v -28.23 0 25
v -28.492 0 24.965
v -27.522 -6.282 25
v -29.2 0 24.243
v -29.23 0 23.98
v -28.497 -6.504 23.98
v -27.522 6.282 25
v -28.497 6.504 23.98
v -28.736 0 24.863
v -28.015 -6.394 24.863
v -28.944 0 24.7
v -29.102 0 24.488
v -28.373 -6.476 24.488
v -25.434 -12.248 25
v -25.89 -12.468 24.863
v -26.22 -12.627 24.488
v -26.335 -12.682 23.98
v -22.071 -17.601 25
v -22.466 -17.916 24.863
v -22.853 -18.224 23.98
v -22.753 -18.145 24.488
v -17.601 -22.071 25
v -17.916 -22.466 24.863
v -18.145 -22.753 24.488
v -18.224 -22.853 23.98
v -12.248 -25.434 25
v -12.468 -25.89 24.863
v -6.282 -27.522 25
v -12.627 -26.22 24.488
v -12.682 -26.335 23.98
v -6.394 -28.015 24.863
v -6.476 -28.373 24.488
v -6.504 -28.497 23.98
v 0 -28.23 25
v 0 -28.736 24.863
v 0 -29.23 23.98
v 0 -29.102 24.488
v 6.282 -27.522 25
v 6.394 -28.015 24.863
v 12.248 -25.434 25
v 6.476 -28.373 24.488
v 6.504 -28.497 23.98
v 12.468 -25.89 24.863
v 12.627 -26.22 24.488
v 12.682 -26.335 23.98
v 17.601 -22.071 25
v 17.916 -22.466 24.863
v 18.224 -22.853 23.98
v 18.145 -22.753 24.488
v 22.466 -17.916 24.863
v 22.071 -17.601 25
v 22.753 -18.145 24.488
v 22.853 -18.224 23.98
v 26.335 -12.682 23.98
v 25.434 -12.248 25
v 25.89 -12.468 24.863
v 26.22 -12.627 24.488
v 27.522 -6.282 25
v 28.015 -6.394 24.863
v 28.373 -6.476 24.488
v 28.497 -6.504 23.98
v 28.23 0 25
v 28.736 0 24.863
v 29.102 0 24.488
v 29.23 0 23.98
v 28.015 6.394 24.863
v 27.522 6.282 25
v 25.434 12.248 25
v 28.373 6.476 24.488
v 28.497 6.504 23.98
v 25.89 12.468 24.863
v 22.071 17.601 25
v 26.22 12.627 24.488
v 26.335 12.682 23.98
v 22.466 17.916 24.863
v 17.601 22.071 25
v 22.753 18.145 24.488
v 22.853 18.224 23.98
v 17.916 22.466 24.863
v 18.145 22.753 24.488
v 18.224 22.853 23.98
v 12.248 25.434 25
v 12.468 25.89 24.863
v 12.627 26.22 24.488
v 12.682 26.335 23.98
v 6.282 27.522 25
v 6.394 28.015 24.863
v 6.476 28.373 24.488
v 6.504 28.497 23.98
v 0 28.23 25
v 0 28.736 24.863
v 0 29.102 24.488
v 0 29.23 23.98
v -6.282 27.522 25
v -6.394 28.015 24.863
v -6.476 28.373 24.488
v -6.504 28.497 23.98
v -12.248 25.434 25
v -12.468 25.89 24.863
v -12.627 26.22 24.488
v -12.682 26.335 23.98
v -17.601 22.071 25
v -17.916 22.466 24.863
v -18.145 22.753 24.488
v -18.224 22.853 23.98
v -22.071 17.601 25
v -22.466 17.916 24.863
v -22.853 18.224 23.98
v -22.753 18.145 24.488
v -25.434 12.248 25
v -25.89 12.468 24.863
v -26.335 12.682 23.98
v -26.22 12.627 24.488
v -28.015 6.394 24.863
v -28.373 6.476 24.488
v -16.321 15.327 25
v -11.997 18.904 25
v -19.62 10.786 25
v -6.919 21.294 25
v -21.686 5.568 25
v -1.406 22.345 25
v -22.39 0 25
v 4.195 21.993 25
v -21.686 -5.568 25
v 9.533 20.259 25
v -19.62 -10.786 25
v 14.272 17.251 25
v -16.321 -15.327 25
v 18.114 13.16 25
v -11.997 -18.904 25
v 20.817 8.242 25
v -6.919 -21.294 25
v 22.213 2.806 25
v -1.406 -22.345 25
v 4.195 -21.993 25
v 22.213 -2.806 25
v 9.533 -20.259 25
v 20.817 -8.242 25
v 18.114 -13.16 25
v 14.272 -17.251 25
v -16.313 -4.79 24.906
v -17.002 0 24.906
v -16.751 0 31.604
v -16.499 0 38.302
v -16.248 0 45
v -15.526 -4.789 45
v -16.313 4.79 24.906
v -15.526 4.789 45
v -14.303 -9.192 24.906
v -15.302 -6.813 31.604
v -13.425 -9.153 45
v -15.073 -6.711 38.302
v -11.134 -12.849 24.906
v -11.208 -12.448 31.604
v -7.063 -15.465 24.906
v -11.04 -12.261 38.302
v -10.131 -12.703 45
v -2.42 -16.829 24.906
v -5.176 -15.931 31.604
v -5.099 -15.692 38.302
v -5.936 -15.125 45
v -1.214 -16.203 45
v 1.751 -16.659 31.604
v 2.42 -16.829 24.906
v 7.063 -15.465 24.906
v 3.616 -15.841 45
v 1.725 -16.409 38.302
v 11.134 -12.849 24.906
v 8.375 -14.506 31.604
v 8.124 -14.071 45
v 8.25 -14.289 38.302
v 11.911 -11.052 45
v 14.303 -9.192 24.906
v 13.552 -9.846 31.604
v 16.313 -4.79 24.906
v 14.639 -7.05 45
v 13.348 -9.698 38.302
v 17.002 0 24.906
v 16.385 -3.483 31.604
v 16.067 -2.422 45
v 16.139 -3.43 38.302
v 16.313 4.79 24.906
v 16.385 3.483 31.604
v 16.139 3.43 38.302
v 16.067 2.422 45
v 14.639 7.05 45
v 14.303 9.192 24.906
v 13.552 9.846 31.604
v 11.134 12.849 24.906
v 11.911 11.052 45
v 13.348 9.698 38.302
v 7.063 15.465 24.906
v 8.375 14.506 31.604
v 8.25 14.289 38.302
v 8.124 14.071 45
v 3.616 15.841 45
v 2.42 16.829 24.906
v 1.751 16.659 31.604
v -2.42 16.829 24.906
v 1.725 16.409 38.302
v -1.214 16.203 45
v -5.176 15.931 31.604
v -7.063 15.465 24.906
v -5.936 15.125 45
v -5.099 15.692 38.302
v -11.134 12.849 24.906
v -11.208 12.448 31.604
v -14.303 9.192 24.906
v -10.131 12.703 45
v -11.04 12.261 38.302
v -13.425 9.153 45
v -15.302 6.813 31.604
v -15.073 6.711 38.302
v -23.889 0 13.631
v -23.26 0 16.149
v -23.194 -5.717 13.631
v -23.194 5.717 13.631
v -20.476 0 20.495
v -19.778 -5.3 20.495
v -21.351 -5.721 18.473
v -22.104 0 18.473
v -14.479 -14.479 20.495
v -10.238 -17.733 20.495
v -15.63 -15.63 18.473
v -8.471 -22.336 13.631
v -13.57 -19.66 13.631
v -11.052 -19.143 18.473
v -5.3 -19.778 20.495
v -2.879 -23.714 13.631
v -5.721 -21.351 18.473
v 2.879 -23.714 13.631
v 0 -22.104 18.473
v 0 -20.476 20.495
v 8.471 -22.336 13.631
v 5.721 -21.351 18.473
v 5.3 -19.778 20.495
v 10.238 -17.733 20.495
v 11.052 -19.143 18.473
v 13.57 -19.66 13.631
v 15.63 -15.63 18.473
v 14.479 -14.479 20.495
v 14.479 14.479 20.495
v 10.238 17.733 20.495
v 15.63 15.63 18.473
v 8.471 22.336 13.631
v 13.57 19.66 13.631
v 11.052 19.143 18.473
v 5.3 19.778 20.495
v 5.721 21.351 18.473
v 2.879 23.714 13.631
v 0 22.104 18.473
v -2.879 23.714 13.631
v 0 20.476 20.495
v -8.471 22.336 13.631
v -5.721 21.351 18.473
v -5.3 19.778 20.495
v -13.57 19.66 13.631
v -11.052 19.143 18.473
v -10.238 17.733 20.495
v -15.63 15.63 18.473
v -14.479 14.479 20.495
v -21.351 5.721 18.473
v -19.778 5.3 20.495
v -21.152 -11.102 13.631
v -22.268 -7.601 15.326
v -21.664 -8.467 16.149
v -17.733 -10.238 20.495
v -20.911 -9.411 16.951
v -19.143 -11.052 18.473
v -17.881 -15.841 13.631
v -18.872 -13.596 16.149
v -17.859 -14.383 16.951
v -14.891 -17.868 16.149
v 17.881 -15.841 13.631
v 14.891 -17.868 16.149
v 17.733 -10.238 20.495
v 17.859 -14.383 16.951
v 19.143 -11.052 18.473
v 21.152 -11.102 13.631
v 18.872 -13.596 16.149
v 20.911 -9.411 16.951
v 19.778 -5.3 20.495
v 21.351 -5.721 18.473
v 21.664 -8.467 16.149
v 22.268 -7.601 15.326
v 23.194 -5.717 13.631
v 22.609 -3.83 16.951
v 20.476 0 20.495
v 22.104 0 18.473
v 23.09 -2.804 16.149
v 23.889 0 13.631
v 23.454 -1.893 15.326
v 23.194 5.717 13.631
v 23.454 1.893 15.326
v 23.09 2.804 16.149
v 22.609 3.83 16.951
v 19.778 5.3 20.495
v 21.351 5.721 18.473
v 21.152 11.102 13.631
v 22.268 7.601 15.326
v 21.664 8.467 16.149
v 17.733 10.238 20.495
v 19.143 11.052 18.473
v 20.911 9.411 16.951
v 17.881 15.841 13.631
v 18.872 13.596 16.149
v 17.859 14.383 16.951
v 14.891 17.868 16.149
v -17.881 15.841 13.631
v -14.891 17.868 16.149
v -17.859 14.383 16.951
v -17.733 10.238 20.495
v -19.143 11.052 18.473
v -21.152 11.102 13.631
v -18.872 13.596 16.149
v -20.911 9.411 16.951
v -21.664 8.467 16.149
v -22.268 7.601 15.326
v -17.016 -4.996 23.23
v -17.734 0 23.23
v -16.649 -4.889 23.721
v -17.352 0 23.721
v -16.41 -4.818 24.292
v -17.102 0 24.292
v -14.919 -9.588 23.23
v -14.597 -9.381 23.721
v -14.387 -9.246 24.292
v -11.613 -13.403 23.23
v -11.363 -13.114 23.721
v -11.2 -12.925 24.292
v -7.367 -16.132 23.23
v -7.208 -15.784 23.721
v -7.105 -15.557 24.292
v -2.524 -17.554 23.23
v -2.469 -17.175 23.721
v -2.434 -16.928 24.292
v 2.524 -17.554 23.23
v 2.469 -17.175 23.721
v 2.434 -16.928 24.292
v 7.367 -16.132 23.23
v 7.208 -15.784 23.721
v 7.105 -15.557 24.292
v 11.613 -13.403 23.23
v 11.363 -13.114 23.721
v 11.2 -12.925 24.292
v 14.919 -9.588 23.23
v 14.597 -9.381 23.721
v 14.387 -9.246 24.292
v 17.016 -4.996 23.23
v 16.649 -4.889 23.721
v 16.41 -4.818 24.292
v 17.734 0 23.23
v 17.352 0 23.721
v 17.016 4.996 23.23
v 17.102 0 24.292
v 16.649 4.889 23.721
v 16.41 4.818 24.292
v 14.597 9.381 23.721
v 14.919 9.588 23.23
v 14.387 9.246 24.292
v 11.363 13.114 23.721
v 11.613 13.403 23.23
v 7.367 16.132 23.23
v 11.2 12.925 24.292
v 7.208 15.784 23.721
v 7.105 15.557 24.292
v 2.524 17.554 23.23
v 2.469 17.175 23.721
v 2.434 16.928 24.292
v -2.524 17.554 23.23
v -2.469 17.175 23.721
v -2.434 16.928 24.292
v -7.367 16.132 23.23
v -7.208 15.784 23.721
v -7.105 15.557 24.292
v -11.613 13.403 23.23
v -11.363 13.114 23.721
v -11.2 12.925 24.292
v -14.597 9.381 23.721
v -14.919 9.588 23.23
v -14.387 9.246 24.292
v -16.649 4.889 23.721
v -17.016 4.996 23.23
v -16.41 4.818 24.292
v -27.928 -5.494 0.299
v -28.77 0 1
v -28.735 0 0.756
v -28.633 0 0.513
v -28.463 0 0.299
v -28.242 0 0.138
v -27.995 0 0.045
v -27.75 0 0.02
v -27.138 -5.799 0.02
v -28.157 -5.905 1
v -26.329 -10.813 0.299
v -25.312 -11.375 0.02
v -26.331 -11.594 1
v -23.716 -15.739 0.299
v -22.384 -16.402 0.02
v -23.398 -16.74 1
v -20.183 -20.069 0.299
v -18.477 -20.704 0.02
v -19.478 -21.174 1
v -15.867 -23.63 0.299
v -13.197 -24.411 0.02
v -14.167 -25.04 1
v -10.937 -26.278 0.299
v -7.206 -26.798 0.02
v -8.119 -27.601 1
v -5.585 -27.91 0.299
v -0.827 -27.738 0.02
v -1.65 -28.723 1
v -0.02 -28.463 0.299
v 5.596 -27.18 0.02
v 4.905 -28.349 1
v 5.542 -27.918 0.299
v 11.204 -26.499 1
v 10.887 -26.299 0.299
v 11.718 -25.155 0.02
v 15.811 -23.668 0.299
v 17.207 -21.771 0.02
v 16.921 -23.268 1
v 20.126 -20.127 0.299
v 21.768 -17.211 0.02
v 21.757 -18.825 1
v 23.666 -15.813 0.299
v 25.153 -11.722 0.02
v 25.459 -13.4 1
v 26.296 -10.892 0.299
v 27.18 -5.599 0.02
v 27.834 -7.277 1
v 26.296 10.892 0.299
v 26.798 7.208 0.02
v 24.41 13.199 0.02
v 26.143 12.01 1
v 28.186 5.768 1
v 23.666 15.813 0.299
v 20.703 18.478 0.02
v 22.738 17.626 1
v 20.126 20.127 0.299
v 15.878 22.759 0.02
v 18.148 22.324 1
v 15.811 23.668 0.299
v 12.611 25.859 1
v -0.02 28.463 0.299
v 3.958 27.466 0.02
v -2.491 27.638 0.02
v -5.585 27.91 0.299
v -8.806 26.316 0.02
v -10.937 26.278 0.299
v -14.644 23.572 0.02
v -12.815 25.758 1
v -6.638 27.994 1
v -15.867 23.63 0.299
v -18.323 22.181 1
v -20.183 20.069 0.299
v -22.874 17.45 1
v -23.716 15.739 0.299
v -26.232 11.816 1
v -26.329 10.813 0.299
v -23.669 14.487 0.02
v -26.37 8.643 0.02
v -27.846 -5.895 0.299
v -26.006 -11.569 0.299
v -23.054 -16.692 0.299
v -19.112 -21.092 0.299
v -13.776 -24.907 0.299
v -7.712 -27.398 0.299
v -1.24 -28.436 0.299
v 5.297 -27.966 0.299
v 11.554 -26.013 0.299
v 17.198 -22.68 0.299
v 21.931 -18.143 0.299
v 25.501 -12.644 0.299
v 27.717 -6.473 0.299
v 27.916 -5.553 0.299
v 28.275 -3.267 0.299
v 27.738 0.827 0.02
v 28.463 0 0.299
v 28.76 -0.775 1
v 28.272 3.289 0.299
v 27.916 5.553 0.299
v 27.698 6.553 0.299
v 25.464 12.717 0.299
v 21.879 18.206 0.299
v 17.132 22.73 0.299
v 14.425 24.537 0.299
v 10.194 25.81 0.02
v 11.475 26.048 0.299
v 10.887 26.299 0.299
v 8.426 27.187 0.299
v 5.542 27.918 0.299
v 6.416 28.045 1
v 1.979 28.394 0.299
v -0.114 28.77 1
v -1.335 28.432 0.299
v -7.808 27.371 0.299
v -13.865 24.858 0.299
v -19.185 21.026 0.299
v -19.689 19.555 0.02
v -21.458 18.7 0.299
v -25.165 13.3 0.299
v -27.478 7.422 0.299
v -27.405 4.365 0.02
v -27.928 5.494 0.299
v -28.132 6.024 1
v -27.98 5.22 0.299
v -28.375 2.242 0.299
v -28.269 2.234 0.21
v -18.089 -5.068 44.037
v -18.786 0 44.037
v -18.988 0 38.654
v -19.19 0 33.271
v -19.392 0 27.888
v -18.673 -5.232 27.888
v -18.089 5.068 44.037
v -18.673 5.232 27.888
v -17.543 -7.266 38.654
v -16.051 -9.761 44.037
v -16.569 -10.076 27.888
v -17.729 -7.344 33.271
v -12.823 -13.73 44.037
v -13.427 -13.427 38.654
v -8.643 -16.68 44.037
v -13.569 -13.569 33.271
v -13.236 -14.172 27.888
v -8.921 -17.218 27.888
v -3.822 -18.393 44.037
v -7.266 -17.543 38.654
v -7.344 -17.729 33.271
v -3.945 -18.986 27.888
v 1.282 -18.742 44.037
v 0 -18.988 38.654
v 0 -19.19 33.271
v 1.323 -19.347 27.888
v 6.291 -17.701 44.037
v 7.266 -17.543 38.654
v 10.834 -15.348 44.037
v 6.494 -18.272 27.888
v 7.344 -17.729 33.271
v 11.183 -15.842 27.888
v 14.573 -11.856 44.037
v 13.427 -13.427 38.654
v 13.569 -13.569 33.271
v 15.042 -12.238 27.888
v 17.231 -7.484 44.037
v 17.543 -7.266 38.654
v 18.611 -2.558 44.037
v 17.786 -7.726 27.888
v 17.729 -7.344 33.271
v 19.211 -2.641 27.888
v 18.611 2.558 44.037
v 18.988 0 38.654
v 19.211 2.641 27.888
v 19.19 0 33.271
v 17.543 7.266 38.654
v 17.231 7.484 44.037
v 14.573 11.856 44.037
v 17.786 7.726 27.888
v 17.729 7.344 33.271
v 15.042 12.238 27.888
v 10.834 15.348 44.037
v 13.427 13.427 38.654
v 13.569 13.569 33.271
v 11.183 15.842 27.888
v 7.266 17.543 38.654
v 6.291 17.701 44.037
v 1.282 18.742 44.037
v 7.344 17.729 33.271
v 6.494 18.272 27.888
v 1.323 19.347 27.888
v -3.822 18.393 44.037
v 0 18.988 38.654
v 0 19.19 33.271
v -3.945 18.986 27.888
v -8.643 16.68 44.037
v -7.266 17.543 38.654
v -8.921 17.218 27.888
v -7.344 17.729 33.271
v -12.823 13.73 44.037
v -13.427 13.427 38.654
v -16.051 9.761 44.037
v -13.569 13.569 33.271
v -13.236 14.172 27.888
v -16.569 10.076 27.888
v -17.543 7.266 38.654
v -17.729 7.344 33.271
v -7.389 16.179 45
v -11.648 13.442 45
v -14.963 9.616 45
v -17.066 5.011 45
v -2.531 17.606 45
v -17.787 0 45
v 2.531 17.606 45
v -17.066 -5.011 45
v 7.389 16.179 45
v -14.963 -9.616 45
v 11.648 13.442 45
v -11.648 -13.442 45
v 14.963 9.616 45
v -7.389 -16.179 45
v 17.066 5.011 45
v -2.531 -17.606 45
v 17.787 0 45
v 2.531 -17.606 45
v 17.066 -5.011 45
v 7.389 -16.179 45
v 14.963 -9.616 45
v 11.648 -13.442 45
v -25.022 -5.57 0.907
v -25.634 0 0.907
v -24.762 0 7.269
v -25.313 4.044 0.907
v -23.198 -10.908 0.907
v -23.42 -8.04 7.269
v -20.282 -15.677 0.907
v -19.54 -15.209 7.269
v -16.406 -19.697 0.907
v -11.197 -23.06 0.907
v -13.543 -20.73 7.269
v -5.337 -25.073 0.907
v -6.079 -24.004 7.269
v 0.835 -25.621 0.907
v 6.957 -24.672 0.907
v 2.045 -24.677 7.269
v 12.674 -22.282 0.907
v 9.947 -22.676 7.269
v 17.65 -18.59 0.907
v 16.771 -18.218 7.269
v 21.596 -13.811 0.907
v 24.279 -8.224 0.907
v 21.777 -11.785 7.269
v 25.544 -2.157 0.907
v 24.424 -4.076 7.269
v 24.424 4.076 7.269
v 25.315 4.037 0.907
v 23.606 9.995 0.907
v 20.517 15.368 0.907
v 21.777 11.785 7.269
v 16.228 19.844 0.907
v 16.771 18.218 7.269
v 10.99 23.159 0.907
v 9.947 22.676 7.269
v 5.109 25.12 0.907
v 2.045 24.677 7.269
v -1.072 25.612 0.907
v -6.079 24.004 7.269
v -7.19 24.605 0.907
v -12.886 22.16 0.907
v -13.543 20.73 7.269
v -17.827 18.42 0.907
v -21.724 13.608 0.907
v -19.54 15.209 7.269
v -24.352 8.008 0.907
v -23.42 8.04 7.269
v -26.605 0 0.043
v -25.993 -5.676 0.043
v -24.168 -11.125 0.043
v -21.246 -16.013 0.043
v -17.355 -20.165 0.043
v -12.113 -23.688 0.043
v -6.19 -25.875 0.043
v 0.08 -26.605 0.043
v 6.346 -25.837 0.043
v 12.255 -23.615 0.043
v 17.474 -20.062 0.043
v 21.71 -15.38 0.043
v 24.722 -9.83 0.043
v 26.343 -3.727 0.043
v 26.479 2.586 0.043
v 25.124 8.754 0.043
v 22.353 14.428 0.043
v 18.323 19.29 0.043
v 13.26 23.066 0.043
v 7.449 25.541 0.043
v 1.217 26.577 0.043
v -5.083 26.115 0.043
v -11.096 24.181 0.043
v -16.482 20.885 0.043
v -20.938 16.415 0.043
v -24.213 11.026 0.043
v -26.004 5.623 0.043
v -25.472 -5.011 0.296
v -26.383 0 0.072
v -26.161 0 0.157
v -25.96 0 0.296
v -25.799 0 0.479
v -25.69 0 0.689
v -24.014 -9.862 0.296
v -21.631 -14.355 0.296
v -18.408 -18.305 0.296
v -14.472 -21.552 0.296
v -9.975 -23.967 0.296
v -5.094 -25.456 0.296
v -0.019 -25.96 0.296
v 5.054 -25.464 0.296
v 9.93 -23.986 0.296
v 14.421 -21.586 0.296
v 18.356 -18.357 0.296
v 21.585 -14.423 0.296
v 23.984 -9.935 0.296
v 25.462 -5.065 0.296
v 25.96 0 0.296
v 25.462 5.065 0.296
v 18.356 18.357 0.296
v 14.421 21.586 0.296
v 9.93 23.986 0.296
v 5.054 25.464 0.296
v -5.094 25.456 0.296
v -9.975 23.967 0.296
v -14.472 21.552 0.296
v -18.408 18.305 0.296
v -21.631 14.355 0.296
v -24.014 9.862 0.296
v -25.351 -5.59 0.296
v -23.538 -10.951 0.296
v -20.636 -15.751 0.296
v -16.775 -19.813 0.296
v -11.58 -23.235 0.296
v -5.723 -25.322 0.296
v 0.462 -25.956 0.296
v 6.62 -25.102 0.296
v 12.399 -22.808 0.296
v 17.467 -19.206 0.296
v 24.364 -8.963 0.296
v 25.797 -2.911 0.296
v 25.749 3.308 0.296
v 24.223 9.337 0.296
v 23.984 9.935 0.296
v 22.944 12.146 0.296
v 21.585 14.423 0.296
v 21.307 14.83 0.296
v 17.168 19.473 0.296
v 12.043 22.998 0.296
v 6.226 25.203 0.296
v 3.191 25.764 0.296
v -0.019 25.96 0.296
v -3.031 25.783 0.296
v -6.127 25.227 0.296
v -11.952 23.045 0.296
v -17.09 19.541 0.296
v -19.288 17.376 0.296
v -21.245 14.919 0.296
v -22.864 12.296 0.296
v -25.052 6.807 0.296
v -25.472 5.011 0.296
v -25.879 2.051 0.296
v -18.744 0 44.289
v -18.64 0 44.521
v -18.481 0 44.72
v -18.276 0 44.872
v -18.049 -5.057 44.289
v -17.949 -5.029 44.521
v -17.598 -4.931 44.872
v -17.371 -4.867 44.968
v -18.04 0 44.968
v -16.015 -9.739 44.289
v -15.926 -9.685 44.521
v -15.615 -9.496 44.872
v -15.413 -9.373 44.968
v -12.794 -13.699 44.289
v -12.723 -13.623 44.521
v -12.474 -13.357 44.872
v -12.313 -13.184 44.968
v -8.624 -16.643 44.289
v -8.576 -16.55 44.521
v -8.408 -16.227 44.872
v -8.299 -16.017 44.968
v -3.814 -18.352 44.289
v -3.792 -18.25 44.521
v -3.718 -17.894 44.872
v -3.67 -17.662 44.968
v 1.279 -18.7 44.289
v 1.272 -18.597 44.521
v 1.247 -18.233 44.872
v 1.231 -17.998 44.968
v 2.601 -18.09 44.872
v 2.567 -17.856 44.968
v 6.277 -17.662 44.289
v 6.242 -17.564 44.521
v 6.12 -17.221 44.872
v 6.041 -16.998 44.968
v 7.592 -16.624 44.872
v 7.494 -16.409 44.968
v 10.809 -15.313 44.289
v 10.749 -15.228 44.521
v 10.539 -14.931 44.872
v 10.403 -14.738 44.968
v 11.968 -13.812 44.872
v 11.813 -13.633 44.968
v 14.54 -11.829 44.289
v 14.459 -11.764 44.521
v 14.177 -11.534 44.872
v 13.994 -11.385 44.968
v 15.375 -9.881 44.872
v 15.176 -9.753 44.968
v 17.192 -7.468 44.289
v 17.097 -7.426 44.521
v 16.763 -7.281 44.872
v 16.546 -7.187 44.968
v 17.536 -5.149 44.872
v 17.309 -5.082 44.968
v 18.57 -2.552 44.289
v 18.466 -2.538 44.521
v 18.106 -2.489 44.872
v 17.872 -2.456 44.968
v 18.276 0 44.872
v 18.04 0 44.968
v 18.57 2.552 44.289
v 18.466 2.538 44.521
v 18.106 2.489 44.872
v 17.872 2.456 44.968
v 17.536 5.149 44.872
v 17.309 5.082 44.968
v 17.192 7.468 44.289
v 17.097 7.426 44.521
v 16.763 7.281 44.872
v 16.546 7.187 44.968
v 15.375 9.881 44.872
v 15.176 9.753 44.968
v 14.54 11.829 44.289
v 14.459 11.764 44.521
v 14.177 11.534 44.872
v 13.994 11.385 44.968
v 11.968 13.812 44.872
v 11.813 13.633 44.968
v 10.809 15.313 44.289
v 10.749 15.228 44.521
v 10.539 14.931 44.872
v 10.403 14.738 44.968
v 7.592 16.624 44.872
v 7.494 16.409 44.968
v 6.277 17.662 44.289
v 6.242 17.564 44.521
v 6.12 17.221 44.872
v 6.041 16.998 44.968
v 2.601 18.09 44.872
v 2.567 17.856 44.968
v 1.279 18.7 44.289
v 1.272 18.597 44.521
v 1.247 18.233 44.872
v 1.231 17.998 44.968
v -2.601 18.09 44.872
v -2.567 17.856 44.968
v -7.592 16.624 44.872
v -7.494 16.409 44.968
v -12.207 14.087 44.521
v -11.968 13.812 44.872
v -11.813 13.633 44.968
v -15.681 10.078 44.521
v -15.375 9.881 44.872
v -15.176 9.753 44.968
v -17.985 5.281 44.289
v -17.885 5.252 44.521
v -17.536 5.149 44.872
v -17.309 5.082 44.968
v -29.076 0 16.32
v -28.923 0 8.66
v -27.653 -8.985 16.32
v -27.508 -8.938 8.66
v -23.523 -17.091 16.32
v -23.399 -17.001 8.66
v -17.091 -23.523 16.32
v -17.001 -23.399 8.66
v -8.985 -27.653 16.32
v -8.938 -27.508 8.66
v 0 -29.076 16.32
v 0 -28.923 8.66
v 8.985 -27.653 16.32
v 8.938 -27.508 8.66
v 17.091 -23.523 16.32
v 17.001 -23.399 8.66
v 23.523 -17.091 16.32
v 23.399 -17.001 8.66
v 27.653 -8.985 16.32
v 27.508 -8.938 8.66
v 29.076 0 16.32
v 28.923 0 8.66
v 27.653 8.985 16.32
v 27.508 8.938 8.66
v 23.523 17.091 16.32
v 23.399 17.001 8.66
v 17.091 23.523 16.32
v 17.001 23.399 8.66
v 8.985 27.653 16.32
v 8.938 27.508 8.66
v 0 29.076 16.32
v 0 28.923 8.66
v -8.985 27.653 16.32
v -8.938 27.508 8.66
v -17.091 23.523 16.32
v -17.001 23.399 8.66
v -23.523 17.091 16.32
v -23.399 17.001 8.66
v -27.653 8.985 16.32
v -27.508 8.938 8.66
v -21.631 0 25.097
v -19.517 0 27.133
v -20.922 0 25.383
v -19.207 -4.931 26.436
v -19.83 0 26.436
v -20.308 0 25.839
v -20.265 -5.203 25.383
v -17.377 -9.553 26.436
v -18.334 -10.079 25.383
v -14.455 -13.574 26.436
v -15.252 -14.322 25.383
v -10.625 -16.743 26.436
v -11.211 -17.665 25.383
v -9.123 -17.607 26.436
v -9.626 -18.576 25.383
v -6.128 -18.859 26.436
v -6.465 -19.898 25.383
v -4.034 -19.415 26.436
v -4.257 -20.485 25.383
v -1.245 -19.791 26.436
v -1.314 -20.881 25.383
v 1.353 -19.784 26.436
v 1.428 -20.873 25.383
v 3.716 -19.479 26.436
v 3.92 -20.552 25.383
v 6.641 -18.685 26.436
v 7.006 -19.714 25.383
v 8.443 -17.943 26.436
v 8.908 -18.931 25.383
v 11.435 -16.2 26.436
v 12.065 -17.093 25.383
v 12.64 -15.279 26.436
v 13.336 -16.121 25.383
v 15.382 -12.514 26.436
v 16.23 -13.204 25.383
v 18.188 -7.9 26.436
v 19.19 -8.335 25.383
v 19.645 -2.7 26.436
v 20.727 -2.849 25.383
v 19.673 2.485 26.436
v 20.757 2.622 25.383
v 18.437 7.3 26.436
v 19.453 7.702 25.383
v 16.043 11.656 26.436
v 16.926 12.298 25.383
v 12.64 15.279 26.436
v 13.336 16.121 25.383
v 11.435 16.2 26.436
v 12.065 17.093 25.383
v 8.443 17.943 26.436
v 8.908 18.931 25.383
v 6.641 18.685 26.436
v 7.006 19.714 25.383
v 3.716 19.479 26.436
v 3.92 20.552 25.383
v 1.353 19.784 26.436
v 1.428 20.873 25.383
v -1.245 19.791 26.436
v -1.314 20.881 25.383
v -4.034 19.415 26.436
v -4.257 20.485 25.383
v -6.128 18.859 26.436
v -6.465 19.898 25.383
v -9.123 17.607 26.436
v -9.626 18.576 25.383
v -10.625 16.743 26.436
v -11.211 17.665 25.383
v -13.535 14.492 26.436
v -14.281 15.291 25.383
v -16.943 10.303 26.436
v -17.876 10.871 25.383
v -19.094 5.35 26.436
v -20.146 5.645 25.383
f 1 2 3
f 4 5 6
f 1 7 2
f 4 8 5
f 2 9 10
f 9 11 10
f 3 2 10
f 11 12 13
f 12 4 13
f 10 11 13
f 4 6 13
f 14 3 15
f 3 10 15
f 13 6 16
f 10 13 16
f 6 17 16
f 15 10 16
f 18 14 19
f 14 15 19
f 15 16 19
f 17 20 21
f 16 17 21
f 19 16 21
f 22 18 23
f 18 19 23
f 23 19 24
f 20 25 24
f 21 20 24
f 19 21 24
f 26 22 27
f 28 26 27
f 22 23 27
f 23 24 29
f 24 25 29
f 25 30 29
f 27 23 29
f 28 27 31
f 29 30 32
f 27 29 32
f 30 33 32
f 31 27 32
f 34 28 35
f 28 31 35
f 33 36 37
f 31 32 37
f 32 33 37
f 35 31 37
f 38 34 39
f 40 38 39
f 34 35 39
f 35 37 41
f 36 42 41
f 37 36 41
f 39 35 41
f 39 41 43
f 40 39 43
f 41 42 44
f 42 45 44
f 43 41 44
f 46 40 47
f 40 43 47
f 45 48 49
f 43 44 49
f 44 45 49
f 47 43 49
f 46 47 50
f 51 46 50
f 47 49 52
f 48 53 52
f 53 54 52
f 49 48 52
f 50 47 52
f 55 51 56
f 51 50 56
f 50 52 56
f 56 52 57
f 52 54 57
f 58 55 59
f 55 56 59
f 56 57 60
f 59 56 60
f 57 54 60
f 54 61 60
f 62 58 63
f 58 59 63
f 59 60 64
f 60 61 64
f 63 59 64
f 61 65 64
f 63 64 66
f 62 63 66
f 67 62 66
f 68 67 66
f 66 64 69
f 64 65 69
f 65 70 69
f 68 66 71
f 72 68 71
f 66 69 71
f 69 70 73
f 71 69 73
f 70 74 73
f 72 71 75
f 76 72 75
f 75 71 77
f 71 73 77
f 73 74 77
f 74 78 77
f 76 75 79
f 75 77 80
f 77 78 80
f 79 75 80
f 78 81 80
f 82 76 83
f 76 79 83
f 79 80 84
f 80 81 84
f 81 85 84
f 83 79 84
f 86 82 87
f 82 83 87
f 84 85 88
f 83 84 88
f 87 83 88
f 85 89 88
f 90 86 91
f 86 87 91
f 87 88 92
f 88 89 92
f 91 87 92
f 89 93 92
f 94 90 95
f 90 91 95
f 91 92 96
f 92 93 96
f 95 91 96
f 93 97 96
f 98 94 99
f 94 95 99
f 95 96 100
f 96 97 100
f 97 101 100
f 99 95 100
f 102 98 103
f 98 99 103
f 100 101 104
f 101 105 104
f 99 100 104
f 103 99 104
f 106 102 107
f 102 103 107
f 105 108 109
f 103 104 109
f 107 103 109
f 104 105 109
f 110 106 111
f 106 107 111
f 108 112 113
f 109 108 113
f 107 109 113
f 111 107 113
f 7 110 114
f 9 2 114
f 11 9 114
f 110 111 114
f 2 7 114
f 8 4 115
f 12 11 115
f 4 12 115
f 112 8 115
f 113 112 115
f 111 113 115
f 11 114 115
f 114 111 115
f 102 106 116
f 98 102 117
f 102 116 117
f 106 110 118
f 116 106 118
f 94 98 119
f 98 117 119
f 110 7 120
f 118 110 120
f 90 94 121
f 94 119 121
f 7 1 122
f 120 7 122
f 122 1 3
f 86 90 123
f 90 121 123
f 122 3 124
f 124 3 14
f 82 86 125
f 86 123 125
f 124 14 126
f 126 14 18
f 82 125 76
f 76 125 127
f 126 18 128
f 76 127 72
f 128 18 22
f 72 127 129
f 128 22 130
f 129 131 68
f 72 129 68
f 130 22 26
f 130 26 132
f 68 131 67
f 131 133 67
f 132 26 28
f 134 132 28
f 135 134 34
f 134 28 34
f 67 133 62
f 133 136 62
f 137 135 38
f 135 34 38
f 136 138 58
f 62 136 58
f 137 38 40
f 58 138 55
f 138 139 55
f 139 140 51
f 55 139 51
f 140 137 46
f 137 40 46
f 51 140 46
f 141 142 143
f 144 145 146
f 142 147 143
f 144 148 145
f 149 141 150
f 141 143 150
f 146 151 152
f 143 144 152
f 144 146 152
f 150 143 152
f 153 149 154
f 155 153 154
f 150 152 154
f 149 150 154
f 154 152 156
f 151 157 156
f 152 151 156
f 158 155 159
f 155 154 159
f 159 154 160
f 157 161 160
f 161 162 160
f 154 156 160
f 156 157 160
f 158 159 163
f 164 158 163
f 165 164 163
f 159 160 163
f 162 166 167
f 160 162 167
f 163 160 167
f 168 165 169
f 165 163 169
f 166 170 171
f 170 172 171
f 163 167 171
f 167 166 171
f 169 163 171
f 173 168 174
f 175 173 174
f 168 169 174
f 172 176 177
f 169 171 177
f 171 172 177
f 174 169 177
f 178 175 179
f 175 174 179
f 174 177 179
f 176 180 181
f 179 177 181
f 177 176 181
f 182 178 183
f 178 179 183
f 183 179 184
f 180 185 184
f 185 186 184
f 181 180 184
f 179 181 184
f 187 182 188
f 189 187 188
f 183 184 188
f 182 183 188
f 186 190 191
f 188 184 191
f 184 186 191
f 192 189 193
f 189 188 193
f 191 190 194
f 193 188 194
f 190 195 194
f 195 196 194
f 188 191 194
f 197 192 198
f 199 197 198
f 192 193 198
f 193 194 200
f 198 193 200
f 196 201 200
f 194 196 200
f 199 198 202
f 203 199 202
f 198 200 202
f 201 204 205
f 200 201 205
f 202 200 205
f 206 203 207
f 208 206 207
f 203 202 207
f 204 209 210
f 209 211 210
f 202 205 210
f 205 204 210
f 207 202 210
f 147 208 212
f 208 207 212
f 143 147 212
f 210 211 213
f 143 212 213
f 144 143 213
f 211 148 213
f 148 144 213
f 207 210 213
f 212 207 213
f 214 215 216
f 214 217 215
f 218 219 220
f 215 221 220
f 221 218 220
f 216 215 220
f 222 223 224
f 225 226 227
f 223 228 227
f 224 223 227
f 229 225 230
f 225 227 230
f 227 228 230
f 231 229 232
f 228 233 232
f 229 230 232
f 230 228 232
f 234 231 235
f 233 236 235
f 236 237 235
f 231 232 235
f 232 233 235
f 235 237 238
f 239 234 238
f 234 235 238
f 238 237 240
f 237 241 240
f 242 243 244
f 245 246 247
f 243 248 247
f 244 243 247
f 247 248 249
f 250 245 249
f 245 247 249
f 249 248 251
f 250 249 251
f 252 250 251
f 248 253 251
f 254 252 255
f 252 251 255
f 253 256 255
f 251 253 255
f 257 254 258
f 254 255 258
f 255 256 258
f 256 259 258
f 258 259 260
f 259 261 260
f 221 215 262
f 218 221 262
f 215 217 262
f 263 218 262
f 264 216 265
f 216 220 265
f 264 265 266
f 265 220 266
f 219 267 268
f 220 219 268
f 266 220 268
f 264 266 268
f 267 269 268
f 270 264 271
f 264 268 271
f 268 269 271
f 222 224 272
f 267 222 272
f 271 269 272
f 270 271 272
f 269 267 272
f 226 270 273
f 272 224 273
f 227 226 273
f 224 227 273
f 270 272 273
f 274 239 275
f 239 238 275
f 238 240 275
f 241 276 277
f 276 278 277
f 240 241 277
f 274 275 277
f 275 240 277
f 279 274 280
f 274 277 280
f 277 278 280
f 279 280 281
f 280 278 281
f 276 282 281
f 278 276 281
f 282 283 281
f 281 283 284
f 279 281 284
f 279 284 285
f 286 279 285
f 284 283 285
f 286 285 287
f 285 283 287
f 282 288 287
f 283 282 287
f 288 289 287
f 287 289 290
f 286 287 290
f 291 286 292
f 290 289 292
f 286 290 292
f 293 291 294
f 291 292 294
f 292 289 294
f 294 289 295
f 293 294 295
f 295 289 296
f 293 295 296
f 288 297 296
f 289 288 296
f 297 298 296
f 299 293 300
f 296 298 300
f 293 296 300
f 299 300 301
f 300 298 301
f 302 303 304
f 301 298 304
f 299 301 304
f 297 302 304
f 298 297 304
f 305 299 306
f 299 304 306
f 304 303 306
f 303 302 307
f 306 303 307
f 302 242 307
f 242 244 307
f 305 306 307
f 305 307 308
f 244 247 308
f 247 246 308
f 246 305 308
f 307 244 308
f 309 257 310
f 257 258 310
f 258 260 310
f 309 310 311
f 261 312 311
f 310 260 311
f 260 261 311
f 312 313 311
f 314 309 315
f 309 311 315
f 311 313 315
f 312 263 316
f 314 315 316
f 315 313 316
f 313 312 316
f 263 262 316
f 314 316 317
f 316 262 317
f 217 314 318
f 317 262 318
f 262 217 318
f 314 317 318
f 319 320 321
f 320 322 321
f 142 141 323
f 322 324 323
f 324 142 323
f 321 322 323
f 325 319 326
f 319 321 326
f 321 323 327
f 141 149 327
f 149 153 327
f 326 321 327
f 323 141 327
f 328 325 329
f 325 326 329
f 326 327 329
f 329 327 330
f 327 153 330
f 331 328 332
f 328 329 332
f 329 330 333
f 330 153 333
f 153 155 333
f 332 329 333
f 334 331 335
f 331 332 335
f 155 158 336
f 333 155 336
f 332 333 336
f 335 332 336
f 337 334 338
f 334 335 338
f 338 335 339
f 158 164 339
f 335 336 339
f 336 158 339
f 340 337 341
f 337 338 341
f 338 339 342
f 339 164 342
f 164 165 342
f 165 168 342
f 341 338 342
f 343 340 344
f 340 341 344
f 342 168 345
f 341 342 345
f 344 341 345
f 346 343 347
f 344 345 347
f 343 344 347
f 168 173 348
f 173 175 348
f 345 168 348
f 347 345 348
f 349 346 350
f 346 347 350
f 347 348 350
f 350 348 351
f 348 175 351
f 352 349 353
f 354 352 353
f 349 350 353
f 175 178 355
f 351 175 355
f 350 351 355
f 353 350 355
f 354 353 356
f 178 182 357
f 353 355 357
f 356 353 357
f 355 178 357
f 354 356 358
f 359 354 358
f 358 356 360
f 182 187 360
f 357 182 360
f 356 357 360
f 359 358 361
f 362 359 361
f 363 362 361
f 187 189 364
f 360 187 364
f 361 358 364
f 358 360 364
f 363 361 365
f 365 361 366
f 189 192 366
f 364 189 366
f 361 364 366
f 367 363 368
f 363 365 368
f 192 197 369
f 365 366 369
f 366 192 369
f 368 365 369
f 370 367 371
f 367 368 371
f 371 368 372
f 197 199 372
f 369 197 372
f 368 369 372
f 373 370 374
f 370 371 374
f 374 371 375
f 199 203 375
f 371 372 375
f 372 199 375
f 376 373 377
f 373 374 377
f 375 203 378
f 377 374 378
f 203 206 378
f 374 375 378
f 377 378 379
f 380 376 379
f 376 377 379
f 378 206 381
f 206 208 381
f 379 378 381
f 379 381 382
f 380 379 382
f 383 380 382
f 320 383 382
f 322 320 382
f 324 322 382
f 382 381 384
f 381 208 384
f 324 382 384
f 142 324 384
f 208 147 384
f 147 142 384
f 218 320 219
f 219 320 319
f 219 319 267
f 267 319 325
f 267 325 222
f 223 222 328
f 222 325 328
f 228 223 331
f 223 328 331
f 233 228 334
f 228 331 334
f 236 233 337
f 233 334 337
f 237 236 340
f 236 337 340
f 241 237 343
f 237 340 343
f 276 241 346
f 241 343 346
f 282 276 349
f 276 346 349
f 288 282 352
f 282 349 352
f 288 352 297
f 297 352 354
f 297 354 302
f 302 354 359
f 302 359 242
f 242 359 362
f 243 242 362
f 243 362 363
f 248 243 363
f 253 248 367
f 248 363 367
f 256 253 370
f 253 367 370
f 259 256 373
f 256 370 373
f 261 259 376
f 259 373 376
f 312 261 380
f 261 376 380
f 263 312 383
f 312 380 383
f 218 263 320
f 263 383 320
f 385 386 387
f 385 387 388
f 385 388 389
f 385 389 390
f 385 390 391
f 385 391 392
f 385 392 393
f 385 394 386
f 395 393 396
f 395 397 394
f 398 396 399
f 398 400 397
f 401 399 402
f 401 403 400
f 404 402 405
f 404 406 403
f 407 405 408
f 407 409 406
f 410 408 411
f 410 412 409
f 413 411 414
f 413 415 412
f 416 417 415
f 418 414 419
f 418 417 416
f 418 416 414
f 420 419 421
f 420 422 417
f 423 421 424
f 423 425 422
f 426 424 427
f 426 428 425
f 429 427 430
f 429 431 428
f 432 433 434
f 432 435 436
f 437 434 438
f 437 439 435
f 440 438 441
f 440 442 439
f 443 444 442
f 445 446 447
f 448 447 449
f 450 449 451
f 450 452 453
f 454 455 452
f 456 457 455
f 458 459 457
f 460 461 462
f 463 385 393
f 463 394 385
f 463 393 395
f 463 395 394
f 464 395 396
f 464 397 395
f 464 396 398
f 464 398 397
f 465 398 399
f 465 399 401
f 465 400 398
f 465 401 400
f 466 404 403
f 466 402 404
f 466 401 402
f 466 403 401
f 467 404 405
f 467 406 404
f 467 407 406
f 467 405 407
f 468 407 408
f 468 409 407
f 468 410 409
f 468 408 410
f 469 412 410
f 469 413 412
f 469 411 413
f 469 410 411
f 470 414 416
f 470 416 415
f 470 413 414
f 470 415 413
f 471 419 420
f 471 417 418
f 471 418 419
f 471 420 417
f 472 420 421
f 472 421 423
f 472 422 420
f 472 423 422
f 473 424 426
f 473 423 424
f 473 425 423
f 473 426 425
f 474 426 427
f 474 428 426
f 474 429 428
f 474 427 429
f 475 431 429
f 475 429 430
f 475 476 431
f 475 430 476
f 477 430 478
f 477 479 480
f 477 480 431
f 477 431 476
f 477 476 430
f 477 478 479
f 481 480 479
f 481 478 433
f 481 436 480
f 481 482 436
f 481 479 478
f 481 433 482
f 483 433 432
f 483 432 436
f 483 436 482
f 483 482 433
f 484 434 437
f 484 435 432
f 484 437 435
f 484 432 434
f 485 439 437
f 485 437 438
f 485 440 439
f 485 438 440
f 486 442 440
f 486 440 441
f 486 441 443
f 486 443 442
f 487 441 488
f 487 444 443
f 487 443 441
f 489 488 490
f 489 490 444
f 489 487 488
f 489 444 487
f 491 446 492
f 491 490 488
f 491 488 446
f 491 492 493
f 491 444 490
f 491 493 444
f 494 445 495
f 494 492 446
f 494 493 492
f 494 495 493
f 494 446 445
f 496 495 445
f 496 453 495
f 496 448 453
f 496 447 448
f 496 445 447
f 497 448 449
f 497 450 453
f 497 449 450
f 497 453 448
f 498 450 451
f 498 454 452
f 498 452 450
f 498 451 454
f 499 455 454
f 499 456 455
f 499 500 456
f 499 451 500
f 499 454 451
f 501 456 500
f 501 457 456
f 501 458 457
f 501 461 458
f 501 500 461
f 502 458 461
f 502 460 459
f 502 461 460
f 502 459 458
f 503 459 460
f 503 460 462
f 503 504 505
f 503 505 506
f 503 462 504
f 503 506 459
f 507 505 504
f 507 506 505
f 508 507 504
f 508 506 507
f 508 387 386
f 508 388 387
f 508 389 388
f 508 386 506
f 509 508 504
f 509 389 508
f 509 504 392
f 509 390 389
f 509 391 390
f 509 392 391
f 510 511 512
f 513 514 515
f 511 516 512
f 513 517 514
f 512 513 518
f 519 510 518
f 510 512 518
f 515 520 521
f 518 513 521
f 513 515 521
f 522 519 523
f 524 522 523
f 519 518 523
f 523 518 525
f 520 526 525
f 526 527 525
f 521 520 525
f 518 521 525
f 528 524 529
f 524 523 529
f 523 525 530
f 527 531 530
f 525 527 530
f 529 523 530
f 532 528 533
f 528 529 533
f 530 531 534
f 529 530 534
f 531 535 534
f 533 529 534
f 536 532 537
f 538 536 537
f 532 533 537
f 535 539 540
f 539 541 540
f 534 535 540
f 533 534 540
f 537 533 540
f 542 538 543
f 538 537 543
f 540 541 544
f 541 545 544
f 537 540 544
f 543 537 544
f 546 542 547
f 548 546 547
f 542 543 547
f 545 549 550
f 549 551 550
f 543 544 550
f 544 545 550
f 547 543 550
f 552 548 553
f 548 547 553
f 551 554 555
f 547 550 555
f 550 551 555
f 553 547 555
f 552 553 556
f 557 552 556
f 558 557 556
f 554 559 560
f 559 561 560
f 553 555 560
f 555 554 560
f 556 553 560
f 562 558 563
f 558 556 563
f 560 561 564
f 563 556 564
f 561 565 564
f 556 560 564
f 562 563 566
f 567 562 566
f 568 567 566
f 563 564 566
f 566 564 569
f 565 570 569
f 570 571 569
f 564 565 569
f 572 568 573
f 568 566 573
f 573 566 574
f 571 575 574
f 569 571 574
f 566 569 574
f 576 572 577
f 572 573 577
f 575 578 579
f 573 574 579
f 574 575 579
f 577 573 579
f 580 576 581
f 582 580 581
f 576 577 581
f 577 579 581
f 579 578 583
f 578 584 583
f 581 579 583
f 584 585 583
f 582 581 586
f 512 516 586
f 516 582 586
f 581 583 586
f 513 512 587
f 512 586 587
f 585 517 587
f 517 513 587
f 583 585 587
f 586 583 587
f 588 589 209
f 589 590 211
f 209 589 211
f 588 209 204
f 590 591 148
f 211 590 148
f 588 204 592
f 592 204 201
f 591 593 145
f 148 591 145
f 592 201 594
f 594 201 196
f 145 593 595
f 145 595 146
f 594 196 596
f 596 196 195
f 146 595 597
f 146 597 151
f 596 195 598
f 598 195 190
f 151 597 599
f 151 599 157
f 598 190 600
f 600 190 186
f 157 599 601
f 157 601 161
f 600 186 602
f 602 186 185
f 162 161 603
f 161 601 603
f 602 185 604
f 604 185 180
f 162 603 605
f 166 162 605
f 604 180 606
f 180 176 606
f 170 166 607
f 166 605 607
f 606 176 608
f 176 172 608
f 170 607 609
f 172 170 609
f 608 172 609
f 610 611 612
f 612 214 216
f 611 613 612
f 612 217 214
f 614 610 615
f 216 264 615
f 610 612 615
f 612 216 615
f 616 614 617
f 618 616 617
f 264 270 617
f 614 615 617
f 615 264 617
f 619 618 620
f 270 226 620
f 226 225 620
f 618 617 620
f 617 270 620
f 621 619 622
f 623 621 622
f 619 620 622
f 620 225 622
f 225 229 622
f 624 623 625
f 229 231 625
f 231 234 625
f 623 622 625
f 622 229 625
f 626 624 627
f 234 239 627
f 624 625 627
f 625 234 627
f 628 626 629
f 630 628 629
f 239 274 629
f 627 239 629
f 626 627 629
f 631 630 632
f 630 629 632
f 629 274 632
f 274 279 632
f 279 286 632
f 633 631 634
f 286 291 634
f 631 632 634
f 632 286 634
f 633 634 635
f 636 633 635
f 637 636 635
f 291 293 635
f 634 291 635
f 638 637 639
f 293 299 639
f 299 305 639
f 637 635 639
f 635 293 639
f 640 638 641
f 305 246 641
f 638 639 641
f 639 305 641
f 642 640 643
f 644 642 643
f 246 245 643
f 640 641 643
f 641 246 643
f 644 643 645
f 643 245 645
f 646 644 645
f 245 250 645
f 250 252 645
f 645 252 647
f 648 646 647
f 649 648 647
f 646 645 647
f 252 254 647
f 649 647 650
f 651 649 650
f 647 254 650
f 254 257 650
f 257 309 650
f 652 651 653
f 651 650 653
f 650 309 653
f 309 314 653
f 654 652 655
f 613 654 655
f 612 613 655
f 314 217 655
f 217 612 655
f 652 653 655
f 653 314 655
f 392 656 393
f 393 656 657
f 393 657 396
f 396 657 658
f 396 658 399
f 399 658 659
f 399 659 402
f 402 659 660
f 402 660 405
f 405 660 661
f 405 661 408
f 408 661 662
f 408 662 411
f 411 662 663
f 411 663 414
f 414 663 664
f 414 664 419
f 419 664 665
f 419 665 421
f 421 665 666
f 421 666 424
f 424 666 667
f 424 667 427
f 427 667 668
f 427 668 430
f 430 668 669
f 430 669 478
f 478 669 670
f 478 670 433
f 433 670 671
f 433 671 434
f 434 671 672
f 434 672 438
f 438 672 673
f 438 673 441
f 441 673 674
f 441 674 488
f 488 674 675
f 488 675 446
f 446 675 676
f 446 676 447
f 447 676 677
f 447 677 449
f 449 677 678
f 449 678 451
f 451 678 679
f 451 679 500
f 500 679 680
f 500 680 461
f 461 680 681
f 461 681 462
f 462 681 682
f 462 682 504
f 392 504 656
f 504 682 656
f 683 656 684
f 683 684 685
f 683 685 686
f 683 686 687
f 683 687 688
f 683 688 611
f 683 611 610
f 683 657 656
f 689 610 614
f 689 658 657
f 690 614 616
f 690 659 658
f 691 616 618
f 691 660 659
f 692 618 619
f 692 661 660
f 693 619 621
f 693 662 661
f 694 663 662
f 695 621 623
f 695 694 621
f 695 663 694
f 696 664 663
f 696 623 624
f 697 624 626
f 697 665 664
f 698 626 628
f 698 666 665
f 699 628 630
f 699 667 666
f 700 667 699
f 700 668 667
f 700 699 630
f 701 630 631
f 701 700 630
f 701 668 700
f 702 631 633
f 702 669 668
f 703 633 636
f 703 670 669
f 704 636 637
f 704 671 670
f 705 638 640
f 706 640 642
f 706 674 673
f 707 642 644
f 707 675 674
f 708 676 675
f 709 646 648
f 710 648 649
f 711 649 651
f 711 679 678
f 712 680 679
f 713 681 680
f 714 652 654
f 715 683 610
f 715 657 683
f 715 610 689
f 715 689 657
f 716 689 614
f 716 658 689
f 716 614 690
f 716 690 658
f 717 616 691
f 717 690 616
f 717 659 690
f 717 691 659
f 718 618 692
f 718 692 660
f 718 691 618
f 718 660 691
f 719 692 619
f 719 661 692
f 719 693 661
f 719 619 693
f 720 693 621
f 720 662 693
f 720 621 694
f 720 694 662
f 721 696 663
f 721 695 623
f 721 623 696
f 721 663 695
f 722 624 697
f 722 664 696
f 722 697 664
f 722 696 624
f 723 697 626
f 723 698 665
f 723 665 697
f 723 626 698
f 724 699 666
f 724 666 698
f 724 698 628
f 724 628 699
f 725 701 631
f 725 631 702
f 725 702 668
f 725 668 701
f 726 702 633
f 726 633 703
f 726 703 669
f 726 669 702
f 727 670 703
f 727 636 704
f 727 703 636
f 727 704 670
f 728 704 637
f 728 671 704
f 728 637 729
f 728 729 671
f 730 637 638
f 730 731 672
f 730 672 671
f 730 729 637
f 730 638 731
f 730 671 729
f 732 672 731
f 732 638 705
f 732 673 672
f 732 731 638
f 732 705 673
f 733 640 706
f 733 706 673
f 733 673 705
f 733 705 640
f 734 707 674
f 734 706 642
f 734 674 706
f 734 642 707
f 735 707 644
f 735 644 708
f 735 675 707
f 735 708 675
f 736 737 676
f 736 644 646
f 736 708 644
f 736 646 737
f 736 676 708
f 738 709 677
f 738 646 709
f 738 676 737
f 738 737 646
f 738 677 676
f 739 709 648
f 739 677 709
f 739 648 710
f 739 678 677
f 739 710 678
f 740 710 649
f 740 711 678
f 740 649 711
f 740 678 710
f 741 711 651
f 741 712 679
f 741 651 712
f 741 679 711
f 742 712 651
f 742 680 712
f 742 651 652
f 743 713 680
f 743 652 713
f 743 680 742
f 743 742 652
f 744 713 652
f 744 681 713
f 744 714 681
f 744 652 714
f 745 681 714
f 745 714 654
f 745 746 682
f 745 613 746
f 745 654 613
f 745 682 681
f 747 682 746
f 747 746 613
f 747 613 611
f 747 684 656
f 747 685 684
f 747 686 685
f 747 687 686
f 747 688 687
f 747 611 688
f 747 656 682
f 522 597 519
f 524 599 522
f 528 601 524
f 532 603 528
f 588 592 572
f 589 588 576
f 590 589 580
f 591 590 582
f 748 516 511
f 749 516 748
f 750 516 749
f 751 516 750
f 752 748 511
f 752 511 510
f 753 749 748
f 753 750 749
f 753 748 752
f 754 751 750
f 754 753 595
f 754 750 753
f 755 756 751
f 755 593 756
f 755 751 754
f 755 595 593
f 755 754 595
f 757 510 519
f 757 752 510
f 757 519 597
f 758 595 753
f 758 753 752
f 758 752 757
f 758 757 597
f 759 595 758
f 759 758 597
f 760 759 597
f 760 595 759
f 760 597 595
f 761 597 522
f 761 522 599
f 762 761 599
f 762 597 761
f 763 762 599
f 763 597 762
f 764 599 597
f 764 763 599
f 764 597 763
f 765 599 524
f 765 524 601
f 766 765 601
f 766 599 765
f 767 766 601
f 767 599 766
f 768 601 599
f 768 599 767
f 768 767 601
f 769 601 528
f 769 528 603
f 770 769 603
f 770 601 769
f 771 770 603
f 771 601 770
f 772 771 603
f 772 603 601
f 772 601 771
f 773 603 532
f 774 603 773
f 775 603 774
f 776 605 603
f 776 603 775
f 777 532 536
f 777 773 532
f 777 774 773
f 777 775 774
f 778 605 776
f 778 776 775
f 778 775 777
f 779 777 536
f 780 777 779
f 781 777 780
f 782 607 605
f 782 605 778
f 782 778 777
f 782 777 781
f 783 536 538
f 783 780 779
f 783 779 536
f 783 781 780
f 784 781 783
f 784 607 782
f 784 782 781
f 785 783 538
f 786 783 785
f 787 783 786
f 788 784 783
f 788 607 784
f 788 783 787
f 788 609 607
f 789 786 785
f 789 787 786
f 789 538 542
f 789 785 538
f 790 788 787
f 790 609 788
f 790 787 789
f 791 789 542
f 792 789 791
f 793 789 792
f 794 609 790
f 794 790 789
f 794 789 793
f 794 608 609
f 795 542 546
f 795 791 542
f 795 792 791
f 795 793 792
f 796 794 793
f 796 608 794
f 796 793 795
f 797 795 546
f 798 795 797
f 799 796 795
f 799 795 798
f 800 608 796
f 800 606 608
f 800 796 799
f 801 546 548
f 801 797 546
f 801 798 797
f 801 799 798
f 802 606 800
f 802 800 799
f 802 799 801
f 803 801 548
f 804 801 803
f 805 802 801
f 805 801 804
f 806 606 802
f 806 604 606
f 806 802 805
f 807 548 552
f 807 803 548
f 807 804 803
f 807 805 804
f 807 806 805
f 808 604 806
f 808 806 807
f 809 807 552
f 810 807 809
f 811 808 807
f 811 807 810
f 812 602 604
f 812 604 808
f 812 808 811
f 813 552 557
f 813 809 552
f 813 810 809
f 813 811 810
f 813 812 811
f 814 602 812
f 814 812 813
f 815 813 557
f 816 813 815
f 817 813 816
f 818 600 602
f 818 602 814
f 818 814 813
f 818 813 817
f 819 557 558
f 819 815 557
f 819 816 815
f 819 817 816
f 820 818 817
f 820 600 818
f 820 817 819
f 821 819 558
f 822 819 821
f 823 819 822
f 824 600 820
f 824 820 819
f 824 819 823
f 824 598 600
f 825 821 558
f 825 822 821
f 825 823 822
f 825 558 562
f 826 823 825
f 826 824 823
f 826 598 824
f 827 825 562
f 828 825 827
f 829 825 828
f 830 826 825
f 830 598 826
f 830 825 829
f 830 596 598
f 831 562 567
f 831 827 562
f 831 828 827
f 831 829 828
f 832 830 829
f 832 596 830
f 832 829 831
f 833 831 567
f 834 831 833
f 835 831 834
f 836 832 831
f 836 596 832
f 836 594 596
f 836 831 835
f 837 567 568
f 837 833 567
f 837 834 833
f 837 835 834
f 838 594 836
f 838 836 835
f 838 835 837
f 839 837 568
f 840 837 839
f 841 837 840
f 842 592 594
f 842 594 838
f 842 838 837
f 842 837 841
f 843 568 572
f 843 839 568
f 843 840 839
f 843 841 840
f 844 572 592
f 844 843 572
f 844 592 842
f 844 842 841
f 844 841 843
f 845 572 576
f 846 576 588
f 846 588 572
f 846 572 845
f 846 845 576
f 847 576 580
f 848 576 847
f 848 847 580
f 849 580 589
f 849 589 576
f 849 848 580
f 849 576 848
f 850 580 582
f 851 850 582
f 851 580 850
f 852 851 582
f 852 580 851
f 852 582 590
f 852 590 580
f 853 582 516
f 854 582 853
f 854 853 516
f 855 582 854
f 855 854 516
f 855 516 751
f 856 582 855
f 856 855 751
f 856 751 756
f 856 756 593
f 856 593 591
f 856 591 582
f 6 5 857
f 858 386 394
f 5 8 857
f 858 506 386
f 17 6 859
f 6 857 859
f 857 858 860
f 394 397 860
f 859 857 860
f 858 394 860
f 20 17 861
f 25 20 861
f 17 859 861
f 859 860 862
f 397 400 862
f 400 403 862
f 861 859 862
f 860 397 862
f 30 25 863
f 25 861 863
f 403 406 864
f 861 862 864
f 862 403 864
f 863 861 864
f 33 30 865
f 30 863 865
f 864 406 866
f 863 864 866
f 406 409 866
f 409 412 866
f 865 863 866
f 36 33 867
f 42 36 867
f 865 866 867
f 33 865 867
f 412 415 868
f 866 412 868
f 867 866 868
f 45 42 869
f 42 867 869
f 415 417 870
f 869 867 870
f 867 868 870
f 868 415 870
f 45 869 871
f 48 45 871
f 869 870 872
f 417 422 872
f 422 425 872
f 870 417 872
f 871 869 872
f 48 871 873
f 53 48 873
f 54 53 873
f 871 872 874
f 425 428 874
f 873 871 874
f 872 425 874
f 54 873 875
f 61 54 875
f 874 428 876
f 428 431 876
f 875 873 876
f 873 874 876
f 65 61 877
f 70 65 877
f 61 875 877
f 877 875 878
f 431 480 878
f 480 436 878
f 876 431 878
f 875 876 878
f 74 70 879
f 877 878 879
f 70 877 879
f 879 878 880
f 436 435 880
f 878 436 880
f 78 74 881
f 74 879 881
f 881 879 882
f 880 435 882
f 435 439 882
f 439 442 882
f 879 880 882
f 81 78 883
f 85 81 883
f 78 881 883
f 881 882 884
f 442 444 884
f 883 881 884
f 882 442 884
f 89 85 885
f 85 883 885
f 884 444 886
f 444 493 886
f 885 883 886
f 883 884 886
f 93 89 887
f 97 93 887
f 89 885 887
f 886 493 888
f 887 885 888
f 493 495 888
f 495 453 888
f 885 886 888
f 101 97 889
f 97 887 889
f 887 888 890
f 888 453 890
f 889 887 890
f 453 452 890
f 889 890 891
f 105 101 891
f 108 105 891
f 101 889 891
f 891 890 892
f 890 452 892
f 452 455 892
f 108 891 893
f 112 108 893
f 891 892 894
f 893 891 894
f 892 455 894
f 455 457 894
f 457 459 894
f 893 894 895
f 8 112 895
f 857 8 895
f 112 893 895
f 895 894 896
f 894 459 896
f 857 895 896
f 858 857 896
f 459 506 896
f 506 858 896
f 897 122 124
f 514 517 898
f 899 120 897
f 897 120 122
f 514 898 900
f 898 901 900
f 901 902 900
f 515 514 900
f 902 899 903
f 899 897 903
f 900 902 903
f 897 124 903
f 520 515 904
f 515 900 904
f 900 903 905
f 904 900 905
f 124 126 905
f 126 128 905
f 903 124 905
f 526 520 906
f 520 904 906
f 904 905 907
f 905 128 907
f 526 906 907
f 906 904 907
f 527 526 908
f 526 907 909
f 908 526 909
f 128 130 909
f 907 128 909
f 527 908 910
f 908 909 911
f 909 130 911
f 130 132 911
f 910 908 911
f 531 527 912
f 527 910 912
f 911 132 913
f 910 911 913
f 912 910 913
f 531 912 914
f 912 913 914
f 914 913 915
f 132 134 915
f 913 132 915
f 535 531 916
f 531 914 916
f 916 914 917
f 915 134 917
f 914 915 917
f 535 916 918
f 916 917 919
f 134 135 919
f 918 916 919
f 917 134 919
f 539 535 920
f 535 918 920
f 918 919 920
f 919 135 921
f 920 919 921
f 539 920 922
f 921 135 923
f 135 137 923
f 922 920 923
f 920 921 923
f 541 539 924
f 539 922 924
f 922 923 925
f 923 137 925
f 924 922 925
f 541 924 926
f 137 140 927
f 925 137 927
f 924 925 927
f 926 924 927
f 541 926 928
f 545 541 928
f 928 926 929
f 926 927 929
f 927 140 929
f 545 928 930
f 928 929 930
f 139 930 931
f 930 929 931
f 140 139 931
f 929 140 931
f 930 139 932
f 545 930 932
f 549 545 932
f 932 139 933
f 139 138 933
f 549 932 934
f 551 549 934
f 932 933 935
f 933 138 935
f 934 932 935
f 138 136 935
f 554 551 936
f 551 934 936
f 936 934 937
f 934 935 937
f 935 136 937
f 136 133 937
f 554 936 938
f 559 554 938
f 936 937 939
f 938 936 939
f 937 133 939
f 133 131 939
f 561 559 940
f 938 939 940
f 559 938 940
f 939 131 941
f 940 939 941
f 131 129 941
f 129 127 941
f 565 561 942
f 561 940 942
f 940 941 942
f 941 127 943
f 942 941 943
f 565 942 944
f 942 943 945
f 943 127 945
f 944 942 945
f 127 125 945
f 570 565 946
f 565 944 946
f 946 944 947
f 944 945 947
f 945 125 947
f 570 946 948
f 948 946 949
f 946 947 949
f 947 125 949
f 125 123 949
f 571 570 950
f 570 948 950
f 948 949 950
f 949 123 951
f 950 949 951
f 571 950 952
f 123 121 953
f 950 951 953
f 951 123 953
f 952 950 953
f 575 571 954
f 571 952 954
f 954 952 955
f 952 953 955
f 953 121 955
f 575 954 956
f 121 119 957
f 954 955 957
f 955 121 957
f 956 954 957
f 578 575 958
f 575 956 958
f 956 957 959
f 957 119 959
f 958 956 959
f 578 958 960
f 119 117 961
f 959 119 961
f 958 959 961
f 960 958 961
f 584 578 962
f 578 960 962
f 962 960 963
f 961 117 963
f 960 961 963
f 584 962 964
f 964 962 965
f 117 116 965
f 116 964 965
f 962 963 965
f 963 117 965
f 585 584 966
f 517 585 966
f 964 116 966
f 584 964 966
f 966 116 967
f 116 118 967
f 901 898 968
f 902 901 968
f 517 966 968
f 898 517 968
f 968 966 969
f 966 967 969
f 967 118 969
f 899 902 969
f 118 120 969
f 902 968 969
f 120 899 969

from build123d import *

# Parameters (mm, degrees)
F3_R = 3
F4_R = 1


with BuildPart() as f2:
    # F1 (on Front) → F2 (revolve)
    with BuildSketch(Plane.XZ):
        with BuildLine():
            Line((-29.25, 25), (-28.75, 0))
            Line((-28.75, 0), (-25.7506, 0.059988))
            Line((-25.7506, 0.059988), (-23.888625, 13.631131))
            ThreePointArc((-23.888625, 13.631131), (-22.745004, 17.342741), (-20.475851, 20.494701))
            Line((-20.475851, 20.494701), (-17.734198, 23.230271))
            ThreePointArc((-17.734198, 23.230271), (-17.209191, 23.998903), (-17.001756, 24.906316))
            Line((-17.001756, 24.906316), (-16.248243, 45))
            Line((-16.248243, 45), (-18.75, 45))
            Line((-18.75, 45), (-19.5, 25))
            Line((-19.5, 25), (-29.25, 25))
        make_face()
    revolve(axis=Axis((0, 0, 37.450496), (0, 0, 1)))

    # F3
    f3_edges = [f2.edges().sort_by_distance(p)[0] for p in [
        (19.5, 0, 25),
    ]]
    fillet(f3_edges, radius=F3_R)

    # F4
    f4_edges = [f2.edges().sort_by_distance(p)[0] for p in [
        (29.25, 0, 25),
        (18.75, 0, 45),
        (28.75, 0, 0),
        (25.7506, 0, 0.059988),
    ]]
    fillet(f4_edges, radius=F4_R)


solid = f2.part
